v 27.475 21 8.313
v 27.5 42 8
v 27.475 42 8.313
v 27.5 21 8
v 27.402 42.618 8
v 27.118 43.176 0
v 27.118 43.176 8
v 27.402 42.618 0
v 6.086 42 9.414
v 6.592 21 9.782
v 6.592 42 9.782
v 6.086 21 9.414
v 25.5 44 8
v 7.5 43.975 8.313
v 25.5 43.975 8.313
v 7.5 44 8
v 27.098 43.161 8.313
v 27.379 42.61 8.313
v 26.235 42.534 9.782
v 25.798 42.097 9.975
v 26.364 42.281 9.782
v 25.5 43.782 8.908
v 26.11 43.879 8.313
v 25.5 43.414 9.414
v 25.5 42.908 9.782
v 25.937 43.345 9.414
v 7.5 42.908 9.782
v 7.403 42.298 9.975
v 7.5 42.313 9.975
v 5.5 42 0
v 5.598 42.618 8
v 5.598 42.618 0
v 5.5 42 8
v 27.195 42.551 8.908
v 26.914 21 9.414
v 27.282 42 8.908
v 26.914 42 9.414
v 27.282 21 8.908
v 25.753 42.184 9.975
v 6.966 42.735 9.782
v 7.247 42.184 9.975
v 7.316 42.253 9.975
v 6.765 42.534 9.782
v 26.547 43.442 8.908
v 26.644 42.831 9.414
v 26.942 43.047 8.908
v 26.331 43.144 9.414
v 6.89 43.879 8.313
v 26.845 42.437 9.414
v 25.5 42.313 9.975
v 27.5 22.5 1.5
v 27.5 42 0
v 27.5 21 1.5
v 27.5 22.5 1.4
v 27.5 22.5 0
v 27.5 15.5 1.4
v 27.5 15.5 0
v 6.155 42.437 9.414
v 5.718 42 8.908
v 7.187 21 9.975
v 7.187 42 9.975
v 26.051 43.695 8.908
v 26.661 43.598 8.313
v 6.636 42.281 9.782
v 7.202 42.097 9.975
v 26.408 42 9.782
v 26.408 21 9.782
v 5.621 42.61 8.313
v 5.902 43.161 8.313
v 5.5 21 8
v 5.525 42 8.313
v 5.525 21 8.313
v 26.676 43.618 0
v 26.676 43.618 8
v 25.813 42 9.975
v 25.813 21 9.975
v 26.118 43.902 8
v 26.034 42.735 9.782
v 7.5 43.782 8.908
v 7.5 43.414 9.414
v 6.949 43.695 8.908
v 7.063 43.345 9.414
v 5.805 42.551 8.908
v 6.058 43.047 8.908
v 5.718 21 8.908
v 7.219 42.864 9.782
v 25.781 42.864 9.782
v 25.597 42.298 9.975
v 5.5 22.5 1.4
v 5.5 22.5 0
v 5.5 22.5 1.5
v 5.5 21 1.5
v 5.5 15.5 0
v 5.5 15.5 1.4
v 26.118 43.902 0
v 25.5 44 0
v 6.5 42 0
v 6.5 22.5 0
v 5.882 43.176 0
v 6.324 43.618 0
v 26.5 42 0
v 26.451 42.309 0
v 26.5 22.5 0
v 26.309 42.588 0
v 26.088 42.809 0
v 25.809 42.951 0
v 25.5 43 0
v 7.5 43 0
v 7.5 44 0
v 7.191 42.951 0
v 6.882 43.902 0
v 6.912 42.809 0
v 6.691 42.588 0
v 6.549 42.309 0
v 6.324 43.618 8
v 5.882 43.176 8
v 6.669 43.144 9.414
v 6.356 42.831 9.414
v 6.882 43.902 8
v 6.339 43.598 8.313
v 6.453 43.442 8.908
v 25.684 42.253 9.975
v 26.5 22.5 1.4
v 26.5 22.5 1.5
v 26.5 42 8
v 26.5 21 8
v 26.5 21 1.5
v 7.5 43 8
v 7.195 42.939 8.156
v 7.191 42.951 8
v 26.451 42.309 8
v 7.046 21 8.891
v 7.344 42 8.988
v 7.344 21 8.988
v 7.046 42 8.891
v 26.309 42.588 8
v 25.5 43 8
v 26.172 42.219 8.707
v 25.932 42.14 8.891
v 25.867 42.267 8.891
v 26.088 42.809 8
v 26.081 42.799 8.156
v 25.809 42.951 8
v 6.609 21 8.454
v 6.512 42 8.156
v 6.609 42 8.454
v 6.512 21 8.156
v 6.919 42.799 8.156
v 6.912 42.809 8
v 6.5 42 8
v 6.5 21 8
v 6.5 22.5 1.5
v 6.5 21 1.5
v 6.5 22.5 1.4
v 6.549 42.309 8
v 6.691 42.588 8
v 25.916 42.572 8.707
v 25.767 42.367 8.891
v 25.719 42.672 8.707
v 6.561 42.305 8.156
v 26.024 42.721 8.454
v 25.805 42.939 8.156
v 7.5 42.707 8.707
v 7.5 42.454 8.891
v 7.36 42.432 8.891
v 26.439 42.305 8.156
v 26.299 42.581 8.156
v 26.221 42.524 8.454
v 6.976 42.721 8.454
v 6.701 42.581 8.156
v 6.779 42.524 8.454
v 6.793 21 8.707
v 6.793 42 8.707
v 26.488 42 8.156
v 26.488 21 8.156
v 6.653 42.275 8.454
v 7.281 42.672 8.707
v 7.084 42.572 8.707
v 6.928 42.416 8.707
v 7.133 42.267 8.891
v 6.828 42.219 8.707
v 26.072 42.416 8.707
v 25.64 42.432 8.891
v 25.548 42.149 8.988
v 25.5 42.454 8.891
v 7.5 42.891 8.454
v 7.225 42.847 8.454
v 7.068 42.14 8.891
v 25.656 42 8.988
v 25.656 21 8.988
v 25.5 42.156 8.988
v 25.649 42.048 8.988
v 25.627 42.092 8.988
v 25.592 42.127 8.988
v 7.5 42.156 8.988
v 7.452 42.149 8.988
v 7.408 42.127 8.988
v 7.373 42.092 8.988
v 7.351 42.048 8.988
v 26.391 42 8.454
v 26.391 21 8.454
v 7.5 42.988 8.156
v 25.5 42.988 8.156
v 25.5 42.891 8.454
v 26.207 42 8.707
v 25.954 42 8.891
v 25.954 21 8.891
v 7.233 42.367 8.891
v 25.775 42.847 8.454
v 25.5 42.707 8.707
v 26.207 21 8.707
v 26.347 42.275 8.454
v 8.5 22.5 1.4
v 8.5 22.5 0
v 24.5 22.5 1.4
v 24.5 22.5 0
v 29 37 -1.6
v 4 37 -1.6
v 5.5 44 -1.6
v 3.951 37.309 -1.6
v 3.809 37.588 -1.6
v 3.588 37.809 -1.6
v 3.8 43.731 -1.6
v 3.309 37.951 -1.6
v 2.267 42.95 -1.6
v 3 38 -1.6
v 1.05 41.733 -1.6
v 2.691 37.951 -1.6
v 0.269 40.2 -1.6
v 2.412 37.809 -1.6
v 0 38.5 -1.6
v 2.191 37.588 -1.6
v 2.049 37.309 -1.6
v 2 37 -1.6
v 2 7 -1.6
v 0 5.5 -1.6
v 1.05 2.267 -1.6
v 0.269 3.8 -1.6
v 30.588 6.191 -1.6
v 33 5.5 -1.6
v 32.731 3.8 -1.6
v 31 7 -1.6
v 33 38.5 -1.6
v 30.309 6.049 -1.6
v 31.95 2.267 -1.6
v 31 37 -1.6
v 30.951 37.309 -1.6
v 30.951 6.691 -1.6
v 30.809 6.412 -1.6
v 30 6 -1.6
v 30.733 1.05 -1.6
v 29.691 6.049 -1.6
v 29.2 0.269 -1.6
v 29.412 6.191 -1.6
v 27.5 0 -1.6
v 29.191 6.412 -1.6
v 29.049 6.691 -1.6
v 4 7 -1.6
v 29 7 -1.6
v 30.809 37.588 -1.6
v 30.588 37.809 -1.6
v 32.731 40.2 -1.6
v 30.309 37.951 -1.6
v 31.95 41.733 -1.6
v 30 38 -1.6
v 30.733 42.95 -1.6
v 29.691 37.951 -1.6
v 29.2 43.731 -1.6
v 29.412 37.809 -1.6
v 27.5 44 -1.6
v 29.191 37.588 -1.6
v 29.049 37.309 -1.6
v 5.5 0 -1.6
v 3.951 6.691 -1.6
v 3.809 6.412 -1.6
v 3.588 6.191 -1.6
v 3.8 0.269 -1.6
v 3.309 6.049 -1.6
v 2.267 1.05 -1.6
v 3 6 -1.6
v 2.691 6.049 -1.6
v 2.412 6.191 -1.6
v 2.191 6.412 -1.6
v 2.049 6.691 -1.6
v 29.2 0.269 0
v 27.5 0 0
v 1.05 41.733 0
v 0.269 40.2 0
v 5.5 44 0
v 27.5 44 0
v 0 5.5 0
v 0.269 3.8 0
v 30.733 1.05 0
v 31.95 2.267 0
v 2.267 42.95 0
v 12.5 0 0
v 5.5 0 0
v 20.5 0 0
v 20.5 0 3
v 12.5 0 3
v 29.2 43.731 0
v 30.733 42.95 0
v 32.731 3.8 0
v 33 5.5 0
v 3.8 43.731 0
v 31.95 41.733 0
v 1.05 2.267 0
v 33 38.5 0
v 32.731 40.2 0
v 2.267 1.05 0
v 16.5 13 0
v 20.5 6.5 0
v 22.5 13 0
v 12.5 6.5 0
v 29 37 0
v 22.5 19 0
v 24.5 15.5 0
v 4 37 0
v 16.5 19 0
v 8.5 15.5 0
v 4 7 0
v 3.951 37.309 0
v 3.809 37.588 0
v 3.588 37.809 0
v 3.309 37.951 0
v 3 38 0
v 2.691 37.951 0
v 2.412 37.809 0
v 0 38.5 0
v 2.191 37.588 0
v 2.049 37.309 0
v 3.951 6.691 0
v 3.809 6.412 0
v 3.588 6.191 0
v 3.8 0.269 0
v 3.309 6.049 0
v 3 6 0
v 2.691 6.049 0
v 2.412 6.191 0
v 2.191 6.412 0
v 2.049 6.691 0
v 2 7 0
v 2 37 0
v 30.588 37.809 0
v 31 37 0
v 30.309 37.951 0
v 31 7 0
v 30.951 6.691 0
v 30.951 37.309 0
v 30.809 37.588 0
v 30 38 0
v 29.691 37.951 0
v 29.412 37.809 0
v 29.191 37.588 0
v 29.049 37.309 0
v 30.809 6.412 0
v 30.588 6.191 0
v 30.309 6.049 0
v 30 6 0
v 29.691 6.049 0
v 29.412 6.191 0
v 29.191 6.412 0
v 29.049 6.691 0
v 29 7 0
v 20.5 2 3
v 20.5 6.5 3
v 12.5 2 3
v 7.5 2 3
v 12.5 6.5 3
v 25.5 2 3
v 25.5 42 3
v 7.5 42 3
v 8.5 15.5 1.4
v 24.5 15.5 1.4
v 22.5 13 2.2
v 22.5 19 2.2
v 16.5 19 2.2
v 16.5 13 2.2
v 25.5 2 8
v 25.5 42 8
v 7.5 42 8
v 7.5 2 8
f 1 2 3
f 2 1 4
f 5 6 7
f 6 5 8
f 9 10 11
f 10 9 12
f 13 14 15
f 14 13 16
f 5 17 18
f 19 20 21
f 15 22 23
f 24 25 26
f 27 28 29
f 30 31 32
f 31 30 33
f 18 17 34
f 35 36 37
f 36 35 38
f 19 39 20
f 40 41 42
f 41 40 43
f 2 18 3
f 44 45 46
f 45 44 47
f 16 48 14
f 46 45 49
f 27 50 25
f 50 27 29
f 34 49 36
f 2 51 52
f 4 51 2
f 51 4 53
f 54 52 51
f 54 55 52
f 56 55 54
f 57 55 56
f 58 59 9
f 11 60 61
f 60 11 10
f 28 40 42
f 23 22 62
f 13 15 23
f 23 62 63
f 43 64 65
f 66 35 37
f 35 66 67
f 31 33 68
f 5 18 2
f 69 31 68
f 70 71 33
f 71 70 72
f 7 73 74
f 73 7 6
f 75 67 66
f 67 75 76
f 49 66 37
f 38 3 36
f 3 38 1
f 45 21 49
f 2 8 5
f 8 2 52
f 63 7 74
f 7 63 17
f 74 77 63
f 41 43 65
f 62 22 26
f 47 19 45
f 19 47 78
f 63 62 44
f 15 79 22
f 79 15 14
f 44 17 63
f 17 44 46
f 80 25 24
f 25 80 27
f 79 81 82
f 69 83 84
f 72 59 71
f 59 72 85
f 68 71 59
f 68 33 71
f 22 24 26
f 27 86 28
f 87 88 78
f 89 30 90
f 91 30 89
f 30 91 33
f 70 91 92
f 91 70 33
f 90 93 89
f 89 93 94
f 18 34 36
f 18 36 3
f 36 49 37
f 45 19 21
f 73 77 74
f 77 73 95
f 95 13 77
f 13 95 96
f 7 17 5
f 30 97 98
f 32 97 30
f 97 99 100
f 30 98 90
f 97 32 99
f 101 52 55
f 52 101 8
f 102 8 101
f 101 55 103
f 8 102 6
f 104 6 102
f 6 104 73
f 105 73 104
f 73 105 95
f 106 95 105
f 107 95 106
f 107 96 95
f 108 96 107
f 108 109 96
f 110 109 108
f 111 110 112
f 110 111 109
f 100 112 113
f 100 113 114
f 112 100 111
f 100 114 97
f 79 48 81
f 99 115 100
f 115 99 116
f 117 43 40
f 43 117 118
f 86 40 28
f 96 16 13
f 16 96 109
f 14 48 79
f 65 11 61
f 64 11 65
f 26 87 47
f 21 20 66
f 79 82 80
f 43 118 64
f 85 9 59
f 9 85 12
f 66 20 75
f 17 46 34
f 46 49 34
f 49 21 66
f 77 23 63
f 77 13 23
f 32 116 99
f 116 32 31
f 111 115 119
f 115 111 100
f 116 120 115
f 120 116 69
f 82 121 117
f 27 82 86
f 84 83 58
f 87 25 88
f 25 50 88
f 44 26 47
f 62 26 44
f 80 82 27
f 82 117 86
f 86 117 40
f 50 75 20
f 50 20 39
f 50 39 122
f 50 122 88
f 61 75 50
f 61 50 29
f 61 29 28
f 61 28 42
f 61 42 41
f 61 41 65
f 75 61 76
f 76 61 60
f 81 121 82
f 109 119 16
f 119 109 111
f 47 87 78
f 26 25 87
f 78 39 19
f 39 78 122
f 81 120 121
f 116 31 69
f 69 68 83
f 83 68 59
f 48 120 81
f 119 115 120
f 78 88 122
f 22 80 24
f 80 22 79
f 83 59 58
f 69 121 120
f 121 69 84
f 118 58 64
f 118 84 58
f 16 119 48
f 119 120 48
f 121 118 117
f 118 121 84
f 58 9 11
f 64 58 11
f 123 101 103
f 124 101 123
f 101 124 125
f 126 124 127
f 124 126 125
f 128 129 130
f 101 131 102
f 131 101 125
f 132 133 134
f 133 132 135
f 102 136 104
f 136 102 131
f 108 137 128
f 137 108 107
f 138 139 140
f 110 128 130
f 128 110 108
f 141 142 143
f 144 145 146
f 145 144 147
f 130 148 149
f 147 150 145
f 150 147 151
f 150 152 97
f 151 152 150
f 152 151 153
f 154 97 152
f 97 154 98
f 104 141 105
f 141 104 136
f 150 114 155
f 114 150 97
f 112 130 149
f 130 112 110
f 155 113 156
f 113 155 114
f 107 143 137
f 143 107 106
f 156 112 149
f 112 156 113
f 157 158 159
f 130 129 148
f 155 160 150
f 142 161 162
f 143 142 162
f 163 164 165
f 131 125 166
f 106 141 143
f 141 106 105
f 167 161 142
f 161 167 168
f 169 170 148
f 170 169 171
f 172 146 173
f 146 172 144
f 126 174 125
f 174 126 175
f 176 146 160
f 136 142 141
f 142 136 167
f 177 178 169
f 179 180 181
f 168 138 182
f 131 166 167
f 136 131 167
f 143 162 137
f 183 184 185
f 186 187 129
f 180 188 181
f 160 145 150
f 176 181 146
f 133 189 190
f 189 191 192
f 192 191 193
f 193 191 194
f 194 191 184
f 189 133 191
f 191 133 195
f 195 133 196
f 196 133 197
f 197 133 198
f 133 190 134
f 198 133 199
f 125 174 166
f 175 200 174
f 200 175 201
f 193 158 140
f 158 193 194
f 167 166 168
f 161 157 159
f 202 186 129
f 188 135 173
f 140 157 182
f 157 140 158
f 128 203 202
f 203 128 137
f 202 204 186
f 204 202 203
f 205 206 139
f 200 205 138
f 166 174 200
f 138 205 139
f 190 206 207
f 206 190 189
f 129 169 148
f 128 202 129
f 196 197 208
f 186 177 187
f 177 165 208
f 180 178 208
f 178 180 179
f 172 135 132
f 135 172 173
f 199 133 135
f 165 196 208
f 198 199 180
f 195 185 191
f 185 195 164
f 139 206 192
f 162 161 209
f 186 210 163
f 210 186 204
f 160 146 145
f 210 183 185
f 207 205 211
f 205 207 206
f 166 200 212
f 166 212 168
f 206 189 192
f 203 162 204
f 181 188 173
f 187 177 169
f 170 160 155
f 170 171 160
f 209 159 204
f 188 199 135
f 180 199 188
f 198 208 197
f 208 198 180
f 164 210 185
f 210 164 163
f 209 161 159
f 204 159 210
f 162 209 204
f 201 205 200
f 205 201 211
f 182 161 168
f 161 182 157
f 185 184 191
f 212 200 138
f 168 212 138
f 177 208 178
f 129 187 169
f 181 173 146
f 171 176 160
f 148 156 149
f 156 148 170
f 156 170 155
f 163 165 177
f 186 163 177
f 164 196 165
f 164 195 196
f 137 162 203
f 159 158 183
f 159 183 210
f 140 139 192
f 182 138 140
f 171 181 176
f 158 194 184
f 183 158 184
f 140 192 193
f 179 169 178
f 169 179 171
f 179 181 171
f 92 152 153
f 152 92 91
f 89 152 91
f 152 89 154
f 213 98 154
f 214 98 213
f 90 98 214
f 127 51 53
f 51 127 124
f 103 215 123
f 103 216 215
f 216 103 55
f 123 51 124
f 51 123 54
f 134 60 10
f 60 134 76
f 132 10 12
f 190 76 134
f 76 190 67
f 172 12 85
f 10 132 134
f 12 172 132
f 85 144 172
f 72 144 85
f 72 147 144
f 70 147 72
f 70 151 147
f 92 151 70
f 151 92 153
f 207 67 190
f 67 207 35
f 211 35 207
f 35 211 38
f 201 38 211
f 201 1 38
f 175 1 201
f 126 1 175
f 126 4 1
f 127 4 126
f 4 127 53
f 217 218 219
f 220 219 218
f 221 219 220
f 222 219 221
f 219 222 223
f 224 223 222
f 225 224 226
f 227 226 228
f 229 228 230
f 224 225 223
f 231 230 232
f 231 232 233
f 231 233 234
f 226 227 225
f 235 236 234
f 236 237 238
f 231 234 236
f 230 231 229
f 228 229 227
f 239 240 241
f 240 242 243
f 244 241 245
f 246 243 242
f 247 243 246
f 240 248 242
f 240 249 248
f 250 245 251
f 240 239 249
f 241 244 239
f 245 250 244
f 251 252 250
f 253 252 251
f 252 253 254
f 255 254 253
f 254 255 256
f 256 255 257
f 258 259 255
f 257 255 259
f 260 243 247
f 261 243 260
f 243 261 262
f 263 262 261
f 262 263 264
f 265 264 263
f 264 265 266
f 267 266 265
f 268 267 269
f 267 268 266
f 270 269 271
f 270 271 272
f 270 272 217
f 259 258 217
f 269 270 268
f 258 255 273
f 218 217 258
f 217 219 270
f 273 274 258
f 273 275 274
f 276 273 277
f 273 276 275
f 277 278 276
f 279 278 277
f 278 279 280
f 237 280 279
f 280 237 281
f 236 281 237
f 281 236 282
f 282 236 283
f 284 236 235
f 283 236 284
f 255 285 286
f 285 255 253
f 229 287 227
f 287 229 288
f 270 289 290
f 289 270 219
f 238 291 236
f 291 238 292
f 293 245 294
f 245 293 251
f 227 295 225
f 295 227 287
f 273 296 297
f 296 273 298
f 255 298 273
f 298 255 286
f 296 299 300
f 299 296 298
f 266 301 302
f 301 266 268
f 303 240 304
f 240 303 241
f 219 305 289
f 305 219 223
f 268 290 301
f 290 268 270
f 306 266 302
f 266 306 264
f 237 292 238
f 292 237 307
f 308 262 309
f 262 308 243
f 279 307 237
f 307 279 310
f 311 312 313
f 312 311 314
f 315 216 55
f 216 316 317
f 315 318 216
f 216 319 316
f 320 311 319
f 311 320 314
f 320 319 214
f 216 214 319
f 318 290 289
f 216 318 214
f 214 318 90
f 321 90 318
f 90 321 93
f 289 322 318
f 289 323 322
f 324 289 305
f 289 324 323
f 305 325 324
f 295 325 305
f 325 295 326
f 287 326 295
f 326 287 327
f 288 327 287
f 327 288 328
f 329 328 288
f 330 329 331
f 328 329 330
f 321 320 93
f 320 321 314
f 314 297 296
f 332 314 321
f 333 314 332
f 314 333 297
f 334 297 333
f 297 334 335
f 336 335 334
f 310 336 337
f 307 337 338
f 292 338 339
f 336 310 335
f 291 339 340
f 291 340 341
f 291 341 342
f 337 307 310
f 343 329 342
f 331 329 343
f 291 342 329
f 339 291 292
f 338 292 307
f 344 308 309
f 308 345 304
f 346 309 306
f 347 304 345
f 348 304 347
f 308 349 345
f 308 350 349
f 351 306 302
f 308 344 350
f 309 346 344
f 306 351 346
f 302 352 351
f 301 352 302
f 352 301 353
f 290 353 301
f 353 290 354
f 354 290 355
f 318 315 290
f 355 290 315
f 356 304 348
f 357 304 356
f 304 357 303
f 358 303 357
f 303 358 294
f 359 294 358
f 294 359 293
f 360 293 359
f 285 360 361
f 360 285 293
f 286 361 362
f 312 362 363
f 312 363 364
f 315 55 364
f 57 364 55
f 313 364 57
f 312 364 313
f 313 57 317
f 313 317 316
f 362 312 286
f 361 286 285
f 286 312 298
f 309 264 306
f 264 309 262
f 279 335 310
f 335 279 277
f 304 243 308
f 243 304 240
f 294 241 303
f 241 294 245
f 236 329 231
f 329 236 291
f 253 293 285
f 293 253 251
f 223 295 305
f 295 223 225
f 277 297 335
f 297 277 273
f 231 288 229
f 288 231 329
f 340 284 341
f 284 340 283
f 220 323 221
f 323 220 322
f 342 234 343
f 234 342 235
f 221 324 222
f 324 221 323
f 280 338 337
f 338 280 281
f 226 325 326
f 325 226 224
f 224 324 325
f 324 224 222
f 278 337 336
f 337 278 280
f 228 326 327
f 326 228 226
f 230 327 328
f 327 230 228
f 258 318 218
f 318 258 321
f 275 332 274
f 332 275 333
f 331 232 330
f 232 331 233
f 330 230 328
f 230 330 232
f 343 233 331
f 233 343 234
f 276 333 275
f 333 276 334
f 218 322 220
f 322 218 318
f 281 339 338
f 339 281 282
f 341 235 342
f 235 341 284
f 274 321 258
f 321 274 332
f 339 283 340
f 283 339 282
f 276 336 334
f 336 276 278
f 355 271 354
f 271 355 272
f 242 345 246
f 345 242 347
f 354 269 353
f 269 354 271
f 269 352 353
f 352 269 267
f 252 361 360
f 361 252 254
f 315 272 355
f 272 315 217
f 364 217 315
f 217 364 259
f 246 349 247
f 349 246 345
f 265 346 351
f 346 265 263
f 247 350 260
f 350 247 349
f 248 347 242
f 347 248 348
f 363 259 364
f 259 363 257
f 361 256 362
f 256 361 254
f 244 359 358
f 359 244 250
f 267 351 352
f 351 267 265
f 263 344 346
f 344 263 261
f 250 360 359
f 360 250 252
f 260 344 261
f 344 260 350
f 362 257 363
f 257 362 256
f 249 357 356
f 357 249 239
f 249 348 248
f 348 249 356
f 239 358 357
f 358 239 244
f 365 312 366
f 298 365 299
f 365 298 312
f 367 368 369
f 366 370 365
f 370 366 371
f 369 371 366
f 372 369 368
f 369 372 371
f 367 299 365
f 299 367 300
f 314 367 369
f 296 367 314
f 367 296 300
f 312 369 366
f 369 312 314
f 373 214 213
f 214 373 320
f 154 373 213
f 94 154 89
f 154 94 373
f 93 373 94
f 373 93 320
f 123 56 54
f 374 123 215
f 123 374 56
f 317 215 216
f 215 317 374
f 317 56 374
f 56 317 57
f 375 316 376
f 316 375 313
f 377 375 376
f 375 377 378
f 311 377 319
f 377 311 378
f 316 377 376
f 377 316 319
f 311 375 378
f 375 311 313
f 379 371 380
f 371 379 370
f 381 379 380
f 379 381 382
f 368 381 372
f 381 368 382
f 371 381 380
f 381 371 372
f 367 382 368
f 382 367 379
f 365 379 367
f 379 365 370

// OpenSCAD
/**
 * Martin Egli
 * 2021-03-19
 * case for vibra reminder, pcb v01
 */
res = 20;

module pcb(th = 1.6, pcb_col = "Green") {
    color(pcb_col) {
        difference() {
            hull() {
                translate([5.5, 5.5, 0])
                cylinder(r = 5.5, h = th, $fn = res);
                translate([33-5.5, 5.5, 0])
                cylinder(r = 5.5, h = th, $fn = res);
                translate([5.5, 44-5.5, 0])
                cylinder(r = 5.5, h = th, $fn = res);
                translate([33-5.5, 44-5.5, 0])
                cylinder(r = 5.5, h = th, $fn = res);
            }
            hull() {
                translate([3, 7, -0.5])
                cylinder(d = 2, h = th+1, $fn = res);
                translate([3, 44-7, -0.5])
                cylinder(d = 2, h = th+1, $fn = res);
            }
            hull() {
                translate([30, 7, -0.5])
                cylinder(d = 2, h = th+1, $fn = res);
                translate([30, 44-7, -0.5])
                cylinder(d = 2, h = th+1, $fn = res);
            }
        }
    }
    color("Black") {
        // micro USB 10104110
        translate([12.5, 0, th])
        cube([8, 6.5, 3]);
        // on switch PCM12SMTR
        translate([5.5, 15.5, th])
        cube([3, 7, 1.4]);
        // user switch PCM12SMTR
        translate([24.5, 15.5, th])
        cube([3, 7, 1.4]);
        // ATTiny85, SOIC-8
        translate([16.5, 13, th])
        cube([6, 6, 2.2]);
    }
    color("Gold") {
        // akku 40 x 18 x 5 mm
        translate([7.5, 2, th+3])
        cube([18, 40, 5]);
    }
}

module case(th = 10, case_col = "Silver", wall_th = 1) {
    color(case_col) {
        difference() {
            hull() {
                translate([2, 2, 0]) {
                    translate([0, 0, 0])
                    cylinder(r = 2, h = th-2, $fn = res);
                    translate([0, 0, th-2])
                    sphere(r = 2, $fn = res);
                }
                translate([20, 2, 0]) {
                    translate([0, 0, 0])
                    cylinder(r = 2, h = th-2, $fn = res);
                    translate([0, 0, th-2])
                    sphere(r = 2, $fn = res);
                }
                translate([2, 44-2, 0]) {
                    translate([0, 0, 0])
                    cylinder(r = 2, h = th-2, $fn = res);
                    translate([0, 0, th-2])
                    sphere(r = 2, $fn = res);
                }
                translate([20, 44-2, 0]) {
                    translate([0, 0, 0])
                    cylinder(r = 2, h = th-2, $fn = res);
                    translate([0, 0, th-2])
                    sphere(r = 2, $fn = res);
                }
            }
            // inner cut out
            hull() {
                translate([2, 2, 0]) {
                    translate([0, 0, -1])
                    cylinder(r = 2-1, h = th-1, $fn = res);
                    translate([0, 0, th-2])
                    sphere(r = 2-1, $fn = res);
                }
                translate([20, 2, 0]) {
                    translate([0, 0, -1])
                    cylinder(r = 2-1, h = th-1, $fn = res);
                    translate([0, 0, th-2])
                    sphere(r = 2-1, $fn = res);
                }
                translate([2, 44-2, 0]) {
                    translate([0, 0, -1])
                    cylinder(r = 2-1, h = th-1, $fn = res);
                    translate([0, 0, th-2])
                    sphere(r = 2-1, $fn = res);
                }
                translate([20, 44-2, 0]) {
                    translate([0, 0, -1])
                    cylinder(r = 2-1, h = th-1, $fn = res);
                    translate([0, 0, th-2])
                    sphere(r = 2-1, $fn = res);
                }
            }
            // micro USB 10104110
            translate([6.8, -1, -1]) 
            cube([8.4, 3, 4.2]);
            // LED ch stat
            translate([20, 7, 1])
            rotate([0, 90, 0])
            cylinder(d = 1, h = 3, $fn = res);
            // LED user
            translate([20, 10, 1])
            rotate([0, 90, 0])
            cylinder(d = 1, h = 3, $fn = res);
            // on switch PCM12SMTR
            translate([-0.5, 15.5, -1])
            cube([3, 7, 2.5]);
            // user switch PCM12SMTR
            translate([20, 15.5, -1])
            cube([3, 7, 2.5]);

            // cut to see inside
            translate([-1, -1, -1])
            cube([30, 22, 20]);
        }
    }
}

translate([5.5, 0, 0]) case();
translate([0, 0, -1.6]) pcb();
